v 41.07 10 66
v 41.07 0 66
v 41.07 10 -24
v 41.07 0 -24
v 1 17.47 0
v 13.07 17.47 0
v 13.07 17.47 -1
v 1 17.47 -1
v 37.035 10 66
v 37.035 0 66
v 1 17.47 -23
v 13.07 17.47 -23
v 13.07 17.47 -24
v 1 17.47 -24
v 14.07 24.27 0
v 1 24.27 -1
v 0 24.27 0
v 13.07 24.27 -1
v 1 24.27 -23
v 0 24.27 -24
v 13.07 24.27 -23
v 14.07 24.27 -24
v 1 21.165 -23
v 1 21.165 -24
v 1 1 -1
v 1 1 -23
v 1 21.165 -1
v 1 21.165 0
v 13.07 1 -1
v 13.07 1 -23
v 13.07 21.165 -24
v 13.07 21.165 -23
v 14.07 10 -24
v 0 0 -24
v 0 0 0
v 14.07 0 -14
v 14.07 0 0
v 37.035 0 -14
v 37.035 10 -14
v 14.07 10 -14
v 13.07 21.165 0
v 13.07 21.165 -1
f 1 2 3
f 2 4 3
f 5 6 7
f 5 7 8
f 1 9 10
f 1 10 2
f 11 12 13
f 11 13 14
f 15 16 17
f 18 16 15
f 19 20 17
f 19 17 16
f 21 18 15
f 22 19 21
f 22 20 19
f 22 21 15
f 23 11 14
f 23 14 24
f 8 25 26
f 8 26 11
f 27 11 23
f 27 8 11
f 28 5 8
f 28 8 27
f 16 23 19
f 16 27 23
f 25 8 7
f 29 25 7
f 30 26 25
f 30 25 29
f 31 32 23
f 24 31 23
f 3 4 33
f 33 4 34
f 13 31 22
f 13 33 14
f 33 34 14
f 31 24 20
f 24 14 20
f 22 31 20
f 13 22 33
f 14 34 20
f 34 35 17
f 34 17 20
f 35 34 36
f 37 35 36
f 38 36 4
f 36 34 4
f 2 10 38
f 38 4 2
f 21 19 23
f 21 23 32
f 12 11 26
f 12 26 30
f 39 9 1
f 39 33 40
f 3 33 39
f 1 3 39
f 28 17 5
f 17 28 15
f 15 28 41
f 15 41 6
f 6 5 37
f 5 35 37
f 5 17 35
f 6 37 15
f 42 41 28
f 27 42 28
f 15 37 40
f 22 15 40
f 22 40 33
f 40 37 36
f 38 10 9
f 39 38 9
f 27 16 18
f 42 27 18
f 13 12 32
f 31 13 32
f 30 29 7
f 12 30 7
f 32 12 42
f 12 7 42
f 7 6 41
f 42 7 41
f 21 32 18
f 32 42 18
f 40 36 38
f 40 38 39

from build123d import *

# Parameters (mm, degrees)
SKETCH1_W               = 14.07
SKETCH1_H               = 24
BOSS_EXTRUDE1_DEPTH     = 24.27
SKETCH3_W               = 12.07
SKETCH3_H               = 22
CUT_EXTRUDE1_DEPTH      = 23.27
CUT_EXTRUDE2_DEPTH      = 37.918800089
CUT_EXTRUDE2_DEPTH_BACK = 37.918800089
SKETCH5_W               = 12.07
SKETCH5_H               = 3.69525946
SKETCH6_W               = 10
SKETCH6_H               = 10
BOSS_EXTRUDE2_DEPTH     = 27
SKETCH7_W               = 4.035
SKETCH7_H               = 10
BOSS_EXTRUDE3_DEPTH     = 80


with BuildPart() as part:
    # Sketch1 → Boss-Extrude1 (new body)
    with BuildSketch(Plane(origin=(0, 0, 0), x_dir=(1, 0, 0), z_dir=(0, 1, 0))):
        with Locations((7.035, 12)):
            Rectangle(SKETCH1_W, SKETCH1_H)
    extrude(amount=BOSS_EXTRUDE1_DEPTH)

    # Sketch3 → Cut-Extrude1 (cut)
    with BuildSketch(Plane(origin=(0, 24.27, 0), x_dir=(1, 0, 0), z_dir=(0, 1, 0))):
        with Locations((7.035, 12)):
            Rectangle(SKETCH3_W, SKETCH3_H)
    extrude(amount=-CUT_EXTRUDE1_DEPTH, mode=Mode.SUBTRACT)

    # Sketch5 → Cut-Extrude2 (cut, two sides: drawn at the far end of the back side and taken through both)
    with BuildSketch(Plane(origin=(0, 0, -24), x_dir=(-1, 0, 0), z_dir=(0, 0, -1)).offset(-CUT_EXTRUDE2_DEPTH_BACK)):
        with Locations((-7.035, 19.31762973)):
            Rectangle(SKETCH5_W, SKETCH5_H)
    extrude(amount=CUT_EXTRUDE2_DEPTH + CUT_EXTRUDE2_DEPTH_BACK, mode=Mode.SUBTRACT)

    # Sketch6 → Boss-Extrude2 (add)
    with BuildSketch(Plane(origin=(14.07, 0, 0), x_dir=(0, 0, -1), z_dir=(1, 0, 0))):
        with Locations((19, 5)):
            Rectangle(SKETCH6_W, SKETCH6_H)
    extrude(amount=BOSS_EXTRUDE2_DEPTH)

    # Sketch7 → Boss-Extrude3 (add)
    with BuildSketch(Plane.XY.offset(-14)):
        with Locations((39.0525, 5)):
            Rectangle(SKETCH7_W, SKETCH7_H)
    extrude(amount=BOSS_EXTRUDE3_DEPTH)


solid = part.part
